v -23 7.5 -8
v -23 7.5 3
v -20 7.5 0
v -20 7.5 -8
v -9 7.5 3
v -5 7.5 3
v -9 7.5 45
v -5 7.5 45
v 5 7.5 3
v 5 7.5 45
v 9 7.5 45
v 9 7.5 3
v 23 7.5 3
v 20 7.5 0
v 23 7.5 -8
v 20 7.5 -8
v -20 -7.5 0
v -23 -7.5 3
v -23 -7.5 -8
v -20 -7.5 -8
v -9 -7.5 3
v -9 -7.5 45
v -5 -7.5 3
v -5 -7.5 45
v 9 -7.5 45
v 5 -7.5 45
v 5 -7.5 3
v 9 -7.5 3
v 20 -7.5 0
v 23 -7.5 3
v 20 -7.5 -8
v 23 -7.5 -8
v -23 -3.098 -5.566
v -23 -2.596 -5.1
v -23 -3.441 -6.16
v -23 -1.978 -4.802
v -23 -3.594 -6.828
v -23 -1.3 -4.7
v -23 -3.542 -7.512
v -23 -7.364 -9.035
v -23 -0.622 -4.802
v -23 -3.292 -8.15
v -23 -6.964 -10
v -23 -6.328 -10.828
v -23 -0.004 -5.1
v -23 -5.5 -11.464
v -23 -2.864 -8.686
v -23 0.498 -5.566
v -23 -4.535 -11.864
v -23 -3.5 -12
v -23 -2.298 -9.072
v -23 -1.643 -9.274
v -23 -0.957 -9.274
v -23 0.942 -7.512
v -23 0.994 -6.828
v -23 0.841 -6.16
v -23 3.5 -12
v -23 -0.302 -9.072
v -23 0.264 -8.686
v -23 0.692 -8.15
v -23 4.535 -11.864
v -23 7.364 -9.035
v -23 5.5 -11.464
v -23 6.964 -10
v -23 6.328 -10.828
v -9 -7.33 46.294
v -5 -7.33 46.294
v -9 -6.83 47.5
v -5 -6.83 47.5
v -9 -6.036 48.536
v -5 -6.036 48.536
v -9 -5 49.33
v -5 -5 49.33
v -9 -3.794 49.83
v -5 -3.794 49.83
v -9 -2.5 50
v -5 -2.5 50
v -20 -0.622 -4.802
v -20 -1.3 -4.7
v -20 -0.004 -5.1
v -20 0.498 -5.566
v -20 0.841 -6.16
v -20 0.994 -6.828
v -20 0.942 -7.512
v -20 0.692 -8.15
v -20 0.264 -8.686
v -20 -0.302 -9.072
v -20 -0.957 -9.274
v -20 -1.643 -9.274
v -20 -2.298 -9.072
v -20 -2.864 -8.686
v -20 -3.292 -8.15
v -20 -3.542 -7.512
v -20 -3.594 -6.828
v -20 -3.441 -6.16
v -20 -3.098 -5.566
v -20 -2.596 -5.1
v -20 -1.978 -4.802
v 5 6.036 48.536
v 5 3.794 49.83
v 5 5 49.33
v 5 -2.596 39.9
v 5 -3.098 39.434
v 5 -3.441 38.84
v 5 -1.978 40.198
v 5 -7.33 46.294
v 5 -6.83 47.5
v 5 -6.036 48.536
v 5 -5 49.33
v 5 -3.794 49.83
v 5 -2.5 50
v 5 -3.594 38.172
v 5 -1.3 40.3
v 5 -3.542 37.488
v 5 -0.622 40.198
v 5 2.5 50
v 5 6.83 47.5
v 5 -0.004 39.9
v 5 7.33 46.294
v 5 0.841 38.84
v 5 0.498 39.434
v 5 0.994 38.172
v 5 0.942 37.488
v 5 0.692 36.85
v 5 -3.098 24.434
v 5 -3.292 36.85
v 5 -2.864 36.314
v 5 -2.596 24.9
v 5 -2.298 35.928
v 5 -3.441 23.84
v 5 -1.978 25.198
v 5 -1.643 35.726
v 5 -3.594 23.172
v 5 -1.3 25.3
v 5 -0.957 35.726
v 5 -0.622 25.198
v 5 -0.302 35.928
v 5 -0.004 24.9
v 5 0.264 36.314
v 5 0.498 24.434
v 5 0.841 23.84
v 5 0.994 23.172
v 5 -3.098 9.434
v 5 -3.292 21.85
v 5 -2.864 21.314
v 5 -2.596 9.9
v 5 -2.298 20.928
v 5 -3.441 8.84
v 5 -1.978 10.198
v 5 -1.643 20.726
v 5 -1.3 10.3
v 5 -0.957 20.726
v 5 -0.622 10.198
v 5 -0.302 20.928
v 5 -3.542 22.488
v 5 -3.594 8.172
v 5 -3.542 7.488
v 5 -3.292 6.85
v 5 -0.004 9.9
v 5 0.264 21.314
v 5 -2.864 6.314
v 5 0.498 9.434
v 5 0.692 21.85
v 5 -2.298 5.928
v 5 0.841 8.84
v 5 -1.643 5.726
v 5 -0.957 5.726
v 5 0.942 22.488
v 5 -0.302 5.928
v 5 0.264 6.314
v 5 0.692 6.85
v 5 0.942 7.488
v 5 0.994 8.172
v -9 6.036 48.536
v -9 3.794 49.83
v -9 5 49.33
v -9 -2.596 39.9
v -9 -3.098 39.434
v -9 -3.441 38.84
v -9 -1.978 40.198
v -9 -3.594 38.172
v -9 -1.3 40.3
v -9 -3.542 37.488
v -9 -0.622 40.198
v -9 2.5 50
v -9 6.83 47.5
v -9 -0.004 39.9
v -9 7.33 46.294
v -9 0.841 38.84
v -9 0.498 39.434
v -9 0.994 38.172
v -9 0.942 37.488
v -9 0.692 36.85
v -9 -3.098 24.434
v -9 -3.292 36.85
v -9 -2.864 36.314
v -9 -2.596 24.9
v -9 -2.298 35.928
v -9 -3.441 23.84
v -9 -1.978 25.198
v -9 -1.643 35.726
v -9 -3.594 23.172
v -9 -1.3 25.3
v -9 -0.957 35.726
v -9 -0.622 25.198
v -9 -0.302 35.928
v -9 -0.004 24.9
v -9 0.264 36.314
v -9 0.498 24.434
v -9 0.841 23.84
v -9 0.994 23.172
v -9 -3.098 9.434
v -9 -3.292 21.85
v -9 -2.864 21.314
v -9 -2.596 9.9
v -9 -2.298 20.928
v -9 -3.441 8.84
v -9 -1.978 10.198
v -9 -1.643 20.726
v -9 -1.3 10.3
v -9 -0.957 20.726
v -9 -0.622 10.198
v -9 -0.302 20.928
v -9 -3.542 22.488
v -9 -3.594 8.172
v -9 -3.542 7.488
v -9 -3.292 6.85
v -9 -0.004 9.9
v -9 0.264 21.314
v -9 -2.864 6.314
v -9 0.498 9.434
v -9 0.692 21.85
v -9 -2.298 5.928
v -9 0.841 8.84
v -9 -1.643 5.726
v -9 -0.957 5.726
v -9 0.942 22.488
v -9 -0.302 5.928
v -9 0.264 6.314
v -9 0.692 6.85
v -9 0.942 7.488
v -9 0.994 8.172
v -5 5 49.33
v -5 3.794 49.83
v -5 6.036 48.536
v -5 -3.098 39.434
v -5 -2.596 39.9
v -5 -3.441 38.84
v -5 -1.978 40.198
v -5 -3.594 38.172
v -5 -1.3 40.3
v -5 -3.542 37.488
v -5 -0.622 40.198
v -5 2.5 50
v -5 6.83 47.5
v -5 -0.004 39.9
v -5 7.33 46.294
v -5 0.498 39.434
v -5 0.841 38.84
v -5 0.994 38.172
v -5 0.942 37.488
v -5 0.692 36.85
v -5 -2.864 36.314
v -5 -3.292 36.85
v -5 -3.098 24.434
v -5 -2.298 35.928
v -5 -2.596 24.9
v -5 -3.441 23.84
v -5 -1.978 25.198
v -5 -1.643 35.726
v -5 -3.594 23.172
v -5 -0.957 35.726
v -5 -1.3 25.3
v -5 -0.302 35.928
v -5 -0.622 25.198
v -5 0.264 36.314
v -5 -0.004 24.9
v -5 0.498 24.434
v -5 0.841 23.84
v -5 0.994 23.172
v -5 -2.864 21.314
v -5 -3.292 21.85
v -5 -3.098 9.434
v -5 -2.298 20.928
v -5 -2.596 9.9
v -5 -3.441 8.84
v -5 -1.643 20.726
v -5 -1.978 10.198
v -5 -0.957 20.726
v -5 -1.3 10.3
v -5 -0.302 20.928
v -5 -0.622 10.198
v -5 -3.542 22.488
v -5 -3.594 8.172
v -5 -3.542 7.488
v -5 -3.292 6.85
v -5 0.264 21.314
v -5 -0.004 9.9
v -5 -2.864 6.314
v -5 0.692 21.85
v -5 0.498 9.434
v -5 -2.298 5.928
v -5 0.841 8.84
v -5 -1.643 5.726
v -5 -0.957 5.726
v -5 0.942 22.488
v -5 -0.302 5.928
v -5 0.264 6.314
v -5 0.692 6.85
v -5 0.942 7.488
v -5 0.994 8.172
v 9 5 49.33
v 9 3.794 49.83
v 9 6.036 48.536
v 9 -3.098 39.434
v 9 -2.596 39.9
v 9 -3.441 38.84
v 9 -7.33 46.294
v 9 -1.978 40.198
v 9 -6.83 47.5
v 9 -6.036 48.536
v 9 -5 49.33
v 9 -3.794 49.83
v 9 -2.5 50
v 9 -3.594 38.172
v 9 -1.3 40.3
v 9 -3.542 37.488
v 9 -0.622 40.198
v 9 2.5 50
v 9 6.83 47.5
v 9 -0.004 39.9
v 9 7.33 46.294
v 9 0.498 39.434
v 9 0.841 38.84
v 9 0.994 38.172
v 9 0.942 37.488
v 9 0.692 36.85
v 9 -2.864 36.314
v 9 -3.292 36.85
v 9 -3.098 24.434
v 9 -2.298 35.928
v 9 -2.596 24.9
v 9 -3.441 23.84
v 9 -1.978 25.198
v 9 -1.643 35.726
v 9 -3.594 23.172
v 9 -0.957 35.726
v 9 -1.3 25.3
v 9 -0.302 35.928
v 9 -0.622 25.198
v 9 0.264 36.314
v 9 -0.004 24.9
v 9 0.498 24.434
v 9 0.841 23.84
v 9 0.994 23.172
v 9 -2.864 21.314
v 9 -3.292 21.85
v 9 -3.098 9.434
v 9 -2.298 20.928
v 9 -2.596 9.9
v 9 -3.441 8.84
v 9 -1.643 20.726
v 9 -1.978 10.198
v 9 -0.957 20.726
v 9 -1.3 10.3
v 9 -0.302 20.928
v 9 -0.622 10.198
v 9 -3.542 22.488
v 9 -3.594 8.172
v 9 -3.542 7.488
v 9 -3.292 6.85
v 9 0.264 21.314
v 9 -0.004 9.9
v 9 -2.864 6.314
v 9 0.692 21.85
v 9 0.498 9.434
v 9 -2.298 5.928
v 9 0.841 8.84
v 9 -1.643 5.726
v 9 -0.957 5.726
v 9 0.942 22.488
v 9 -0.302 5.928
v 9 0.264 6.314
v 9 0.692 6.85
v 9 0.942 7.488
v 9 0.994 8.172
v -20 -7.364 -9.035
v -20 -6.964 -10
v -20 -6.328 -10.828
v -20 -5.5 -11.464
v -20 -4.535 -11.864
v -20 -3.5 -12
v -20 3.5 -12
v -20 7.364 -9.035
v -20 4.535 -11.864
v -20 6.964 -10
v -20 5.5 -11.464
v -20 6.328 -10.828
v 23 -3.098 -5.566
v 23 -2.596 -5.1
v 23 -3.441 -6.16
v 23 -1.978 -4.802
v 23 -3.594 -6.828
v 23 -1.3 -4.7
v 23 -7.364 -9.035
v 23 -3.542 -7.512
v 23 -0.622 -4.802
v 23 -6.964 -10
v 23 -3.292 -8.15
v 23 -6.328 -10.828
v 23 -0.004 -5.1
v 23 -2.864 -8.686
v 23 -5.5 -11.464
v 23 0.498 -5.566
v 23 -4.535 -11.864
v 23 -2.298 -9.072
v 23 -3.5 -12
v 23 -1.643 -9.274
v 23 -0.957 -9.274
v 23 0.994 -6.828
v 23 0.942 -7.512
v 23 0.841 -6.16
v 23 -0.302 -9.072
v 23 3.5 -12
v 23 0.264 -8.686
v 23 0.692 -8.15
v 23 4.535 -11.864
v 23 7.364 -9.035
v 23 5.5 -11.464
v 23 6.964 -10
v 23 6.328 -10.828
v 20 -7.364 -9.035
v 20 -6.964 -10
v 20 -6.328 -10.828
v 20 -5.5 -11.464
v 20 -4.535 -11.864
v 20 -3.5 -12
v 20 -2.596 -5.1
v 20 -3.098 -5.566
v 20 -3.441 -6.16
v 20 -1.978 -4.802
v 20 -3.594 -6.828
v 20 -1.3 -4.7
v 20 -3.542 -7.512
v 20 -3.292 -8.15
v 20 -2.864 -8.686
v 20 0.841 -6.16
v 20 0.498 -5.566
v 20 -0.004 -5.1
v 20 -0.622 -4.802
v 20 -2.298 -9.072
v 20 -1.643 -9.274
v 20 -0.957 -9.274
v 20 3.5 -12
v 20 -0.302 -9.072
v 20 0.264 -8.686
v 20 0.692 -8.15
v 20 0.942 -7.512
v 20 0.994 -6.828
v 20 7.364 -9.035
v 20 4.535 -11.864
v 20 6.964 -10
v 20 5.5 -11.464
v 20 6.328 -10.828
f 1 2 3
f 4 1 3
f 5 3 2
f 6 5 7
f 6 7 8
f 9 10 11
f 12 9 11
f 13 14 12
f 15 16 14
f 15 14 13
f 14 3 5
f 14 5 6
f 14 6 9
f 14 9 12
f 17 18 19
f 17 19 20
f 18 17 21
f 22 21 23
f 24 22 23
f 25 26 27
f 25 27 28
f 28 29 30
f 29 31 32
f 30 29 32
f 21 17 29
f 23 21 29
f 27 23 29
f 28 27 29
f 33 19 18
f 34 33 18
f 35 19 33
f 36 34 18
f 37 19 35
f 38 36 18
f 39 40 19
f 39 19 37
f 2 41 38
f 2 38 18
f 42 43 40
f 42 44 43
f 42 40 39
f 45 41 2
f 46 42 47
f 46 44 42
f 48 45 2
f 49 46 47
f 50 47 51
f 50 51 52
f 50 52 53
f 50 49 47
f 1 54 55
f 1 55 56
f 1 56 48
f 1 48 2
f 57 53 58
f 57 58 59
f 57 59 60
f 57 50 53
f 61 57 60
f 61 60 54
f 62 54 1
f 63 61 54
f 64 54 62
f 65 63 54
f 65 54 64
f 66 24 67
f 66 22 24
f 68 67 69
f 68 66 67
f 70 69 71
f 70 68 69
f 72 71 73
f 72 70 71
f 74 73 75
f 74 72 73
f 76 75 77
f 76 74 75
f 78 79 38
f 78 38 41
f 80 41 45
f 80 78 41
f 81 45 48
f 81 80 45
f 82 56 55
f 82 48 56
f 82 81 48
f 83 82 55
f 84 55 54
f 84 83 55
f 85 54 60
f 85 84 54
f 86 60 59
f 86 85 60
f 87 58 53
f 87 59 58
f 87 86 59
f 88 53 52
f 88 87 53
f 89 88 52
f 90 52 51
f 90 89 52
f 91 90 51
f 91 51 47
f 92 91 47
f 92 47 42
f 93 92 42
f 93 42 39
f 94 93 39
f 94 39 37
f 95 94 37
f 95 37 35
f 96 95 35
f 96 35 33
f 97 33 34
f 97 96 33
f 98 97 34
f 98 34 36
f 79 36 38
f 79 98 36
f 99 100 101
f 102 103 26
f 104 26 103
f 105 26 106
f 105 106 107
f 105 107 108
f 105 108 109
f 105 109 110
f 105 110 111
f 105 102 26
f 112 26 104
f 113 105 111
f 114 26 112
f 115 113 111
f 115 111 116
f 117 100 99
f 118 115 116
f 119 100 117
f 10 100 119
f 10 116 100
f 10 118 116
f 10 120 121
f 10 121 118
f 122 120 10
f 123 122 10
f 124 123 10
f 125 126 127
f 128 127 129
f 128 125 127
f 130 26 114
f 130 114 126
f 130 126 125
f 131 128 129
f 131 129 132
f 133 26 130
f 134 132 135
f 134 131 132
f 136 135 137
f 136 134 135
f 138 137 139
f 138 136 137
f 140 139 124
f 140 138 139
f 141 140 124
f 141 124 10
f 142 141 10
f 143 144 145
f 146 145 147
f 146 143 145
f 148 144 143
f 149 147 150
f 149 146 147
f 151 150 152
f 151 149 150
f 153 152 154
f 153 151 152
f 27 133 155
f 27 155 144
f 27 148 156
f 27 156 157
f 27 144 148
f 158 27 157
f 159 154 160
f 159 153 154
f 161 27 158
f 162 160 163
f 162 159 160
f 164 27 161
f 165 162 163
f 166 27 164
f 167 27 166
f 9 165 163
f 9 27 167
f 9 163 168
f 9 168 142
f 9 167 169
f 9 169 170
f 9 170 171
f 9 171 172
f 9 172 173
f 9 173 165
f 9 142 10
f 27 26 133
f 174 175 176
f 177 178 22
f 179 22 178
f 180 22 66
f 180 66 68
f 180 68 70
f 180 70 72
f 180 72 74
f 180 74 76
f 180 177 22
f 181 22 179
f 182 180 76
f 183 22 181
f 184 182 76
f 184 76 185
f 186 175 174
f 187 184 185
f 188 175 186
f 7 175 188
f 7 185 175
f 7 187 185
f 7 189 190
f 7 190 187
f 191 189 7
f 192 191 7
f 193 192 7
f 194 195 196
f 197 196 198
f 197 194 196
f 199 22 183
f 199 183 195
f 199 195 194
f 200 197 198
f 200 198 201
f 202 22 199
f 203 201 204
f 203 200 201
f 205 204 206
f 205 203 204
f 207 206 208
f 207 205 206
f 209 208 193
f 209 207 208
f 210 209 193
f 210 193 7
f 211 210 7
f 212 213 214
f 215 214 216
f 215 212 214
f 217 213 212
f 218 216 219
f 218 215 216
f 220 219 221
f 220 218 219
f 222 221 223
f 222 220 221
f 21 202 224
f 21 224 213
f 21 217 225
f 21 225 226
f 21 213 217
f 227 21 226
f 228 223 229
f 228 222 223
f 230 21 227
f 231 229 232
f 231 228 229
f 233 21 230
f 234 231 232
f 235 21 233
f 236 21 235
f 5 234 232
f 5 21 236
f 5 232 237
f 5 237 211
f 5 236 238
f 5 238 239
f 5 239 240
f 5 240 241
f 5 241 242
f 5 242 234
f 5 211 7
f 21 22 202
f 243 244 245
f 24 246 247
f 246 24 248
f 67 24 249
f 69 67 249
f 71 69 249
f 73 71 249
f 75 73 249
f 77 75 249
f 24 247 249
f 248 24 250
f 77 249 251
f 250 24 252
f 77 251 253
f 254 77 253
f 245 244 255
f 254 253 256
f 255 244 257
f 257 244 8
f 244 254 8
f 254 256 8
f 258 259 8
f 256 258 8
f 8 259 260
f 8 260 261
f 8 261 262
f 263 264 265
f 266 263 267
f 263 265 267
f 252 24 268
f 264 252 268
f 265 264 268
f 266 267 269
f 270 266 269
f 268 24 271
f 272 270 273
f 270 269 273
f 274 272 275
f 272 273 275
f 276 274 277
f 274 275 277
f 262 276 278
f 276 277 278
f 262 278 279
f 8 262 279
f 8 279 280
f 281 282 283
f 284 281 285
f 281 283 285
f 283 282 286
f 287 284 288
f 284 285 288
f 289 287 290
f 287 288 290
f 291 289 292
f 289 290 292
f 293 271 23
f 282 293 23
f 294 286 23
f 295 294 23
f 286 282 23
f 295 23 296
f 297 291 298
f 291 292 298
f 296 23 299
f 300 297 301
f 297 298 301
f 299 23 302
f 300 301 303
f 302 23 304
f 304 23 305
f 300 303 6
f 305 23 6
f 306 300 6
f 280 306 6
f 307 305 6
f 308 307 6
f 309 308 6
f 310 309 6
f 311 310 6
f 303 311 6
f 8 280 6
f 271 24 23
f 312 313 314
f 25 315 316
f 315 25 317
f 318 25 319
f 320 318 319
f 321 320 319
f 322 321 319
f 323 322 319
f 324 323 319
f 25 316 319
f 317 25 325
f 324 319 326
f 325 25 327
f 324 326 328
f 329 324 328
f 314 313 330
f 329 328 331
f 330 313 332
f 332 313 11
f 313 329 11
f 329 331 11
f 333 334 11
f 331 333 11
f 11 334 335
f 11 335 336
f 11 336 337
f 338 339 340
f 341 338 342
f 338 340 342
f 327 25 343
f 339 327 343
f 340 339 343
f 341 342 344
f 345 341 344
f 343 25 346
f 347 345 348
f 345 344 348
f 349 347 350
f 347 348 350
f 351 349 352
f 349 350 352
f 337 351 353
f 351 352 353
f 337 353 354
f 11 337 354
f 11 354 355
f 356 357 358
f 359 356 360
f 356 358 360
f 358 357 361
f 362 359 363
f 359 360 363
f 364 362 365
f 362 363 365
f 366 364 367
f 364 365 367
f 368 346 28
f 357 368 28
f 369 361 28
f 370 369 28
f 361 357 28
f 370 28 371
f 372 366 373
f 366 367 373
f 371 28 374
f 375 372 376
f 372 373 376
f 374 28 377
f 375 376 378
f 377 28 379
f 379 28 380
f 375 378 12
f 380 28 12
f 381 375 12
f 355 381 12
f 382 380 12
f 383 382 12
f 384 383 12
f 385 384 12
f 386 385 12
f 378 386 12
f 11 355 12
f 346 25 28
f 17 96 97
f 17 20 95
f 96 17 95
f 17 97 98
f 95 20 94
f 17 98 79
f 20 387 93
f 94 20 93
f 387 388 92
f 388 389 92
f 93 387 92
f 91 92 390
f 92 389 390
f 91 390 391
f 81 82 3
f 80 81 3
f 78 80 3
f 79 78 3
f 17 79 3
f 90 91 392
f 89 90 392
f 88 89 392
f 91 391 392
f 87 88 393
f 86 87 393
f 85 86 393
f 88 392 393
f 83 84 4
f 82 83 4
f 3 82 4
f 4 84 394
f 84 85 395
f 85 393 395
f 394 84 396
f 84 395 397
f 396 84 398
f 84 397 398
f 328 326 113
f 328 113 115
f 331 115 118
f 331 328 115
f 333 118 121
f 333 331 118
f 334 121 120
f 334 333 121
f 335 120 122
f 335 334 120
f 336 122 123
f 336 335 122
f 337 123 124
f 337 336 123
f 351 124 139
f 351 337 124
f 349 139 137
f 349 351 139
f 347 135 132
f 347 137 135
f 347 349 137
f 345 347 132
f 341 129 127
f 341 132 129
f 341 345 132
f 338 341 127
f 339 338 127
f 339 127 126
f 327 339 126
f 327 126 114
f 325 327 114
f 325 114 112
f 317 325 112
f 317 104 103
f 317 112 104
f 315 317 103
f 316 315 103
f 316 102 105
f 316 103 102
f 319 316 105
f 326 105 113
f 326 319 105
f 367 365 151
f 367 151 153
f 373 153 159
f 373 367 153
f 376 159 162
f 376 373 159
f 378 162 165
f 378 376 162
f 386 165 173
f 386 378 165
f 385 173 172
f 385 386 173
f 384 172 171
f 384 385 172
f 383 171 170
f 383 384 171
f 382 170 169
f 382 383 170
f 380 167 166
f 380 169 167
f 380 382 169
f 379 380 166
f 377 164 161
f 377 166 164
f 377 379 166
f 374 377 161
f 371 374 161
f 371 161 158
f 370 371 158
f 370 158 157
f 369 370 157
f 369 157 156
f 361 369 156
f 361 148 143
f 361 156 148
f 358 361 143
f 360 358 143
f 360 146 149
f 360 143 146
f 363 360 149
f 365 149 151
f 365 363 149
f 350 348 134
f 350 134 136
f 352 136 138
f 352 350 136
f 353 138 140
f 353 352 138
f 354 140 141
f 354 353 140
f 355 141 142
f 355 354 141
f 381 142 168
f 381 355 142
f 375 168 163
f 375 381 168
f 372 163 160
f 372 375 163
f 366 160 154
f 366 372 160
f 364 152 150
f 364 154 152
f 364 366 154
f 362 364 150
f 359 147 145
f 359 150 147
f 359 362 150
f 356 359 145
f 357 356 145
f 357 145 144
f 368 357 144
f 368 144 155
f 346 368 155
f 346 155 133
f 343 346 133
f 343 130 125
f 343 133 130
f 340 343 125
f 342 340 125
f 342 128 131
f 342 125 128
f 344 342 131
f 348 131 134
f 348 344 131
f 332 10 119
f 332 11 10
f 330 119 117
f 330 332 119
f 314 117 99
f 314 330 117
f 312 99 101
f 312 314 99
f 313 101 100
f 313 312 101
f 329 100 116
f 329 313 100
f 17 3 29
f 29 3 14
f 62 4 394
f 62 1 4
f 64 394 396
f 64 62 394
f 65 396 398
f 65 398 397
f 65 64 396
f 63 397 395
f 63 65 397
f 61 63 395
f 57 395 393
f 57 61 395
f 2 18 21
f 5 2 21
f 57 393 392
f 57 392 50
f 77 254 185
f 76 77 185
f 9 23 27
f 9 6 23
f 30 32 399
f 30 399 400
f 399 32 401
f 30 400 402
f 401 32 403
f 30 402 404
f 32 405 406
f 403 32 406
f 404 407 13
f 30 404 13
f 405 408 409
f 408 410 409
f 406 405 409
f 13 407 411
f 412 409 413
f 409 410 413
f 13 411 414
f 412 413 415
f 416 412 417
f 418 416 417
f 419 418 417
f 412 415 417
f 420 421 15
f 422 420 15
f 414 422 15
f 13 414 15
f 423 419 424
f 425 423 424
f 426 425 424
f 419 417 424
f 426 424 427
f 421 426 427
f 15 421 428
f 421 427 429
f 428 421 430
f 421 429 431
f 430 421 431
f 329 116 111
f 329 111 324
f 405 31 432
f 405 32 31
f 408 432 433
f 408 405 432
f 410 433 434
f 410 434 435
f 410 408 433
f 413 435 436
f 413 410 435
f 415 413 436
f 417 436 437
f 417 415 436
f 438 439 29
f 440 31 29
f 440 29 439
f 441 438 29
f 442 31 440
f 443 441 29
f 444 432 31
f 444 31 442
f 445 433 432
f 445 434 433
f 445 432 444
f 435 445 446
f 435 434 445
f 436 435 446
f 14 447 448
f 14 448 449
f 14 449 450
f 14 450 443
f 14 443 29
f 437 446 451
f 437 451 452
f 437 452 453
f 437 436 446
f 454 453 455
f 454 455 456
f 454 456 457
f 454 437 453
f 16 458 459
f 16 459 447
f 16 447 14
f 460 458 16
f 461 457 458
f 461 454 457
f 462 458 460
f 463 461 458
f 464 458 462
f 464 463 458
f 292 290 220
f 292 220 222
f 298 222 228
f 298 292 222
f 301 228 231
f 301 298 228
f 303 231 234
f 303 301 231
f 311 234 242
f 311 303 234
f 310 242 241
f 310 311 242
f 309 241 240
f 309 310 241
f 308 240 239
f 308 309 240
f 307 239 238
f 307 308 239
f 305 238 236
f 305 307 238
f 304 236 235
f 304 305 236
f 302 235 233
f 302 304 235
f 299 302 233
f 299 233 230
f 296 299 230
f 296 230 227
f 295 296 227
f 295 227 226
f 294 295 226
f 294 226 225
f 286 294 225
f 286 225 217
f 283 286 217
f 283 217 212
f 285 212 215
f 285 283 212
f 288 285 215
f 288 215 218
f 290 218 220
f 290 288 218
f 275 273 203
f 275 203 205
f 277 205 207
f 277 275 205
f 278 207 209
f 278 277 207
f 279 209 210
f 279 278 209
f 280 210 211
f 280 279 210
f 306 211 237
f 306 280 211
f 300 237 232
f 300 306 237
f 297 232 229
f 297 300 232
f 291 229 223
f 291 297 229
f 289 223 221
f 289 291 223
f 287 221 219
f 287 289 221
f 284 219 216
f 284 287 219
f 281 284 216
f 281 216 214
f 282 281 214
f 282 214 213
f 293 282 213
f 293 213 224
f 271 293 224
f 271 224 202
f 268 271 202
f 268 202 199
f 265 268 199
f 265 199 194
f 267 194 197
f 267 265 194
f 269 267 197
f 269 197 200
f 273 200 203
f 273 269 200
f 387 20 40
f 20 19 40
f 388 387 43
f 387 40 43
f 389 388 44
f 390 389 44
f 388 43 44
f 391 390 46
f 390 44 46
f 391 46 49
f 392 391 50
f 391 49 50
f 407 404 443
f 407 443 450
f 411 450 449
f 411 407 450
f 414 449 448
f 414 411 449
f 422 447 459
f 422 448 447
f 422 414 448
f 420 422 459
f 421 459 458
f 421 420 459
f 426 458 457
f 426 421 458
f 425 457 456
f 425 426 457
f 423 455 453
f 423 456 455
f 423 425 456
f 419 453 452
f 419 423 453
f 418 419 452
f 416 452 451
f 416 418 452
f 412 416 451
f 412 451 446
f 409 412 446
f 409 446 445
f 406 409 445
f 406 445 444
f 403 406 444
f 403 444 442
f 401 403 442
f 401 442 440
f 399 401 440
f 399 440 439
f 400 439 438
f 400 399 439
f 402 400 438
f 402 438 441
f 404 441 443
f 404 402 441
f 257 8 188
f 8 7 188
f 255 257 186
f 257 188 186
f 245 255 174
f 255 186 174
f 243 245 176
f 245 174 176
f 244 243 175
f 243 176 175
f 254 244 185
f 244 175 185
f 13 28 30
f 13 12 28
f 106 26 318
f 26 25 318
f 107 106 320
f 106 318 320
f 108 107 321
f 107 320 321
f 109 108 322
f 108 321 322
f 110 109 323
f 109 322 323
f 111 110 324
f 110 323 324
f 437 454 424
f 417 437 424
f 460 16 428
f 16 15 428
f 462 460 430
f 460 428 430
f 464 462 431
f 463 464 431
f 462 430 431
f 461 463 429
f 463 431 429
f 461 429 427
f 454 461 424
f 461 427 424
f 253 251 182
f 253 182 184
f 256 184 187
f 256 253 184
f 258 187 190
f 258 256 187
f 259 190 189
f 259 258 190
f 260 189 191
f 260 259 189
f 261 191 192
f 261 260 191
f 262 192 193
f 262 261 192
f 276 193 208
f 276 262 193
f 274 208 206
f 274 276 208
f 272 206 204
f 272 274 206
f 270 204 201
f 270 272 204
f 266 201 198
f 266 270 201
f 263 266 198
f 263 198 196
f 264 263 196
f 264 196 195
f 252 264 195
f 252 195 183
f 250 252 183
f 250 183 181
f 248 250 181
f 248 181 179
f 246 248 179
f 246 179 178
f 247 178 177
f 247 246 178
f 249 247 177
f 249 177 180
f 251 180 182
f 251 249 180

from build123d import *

# Parameters (mm, degrees)
CYLINDER_R     = 2.3
CYLINDER_DEPTH = 50
ARRAY_Z_COUNT  = 4
ARRAY_Z_PITCH  = 15
BOX_W          = 40
BOX_H          = 15
BOX_DEPTH      = 3
BOX002_W       = 4
BOX002_H       = 15
BOX002_DEPTH   = 50
FILLET_R       = 5
BOX001_W       = 3
BOX001_H       = 15
BOX001_DEPTH   = 15
FILLET001_R    = 4


with BuildPart() as bolt_hole_array:
    # Cylinder → Cylinder (new body)
    with BuildSketch(Plane(origin=(25, -1.3, -7), x_dir=(0, 0, 1), z_dir=(-1, 0, 0))):
        Circle(CYLINDER_R)
    extrude(amount=CYLINDER_DEPTH)

    # Array Z: bolt hole array ×4


with BuildPart() as bolt_hole_array_1:
    add(bolt_hole_array.part)
    with Locations(*[(0, 0, i * ARRAY_Z_PITCH) for i in range(1, ARRAY_Z_COUNT)]):
        add(bolt_hole_array.part)


with BuildPart() as top_panel:
    # Box → Box (new body)
    with BuildSketch(Plane(origin=(-20, -7.5, 0), x_dir=(1, 0, 0), z_dir=(0, 0, 1))):
        with Locations((20, 7.5)):
            Rectangle(BOX_W, BOX_H)
    extrude(amount=BOX_DEPTH)


with BuildPart() as vertical_cube_fillet:
    # Box002 → Box002 (new body)
    with BuildSketch(Plane(origin=(5, -7.5, 0), x_dir=(1, 0, 0), z_dir=(0, 0, 1))):
        with Locations((2, 7.5)):
            Rectangle(BOX002_W, BOX002_H)
    extrude(amount=BOX002_DEPTH)

    # Fillet
    fillet_edges = [vertical_cube_fillet.edges().sort_by_distance(p)[0] for p in [
        (7, -7.5, 50),
        (7, 7.5, 50),
    ]]
    fillet(fillet_edges, radius=FILLET_R)


with BuildPart() as part_mirroring001:
    # Part__Mirroring001: instance of vertical cube fillet
    add(vertical_cube_fillet.part.mirror(Plane(origin=(0, 0, 0), x_dir=(0, -1, 0), z_dir=(1, 0, 0))))


with BuildPart() as side_cube_fillet:
    # Box001 → Box001 (new body)
    with BuildSketch(Plane(origin=(20, -7.5, -12), x_dir=(1, 0, 0), z_dir=(0, 0, 1))):
        with Locations((1.5, 7.5)):
            Rectangle(BOX001_W, BOX001_H)
    extrude(amount=BOX001_DEPTH)

    # Fillet001
    fillet001_edges = [side_cube_fillet.edges().sort_by_distance(p)[0] for p in [
        (21.5, -7.5, -12),
        (21.5, 7.5, -12),
    ]]
    fillet(fillet001_edges, radius=FILLET001_R)


with BuildPart() as wire_holder_cut:
    # Part__Mirroring: instance of side cube fillet
    add(side_cube_fillet.part.mirror(Plane(origin=(0, 0, 0), x_dir=(0, -1, 0), z_dir=(1, 0, 0))))

    # Fusion: union top panel, Part__Mirroring001, vertical cube fillet, side cube fillet
    add(top_panel.part)
    add(part_mirroring001.part)
    add(vertical_cube_fillet.part)
    add(side_cube_fillet.part)

    # Cut: cut bolt hole array
    add(bolt_hole_array_1.part, mode=Mode.SUBTRACT)


solid = wire_holder_cut.part
